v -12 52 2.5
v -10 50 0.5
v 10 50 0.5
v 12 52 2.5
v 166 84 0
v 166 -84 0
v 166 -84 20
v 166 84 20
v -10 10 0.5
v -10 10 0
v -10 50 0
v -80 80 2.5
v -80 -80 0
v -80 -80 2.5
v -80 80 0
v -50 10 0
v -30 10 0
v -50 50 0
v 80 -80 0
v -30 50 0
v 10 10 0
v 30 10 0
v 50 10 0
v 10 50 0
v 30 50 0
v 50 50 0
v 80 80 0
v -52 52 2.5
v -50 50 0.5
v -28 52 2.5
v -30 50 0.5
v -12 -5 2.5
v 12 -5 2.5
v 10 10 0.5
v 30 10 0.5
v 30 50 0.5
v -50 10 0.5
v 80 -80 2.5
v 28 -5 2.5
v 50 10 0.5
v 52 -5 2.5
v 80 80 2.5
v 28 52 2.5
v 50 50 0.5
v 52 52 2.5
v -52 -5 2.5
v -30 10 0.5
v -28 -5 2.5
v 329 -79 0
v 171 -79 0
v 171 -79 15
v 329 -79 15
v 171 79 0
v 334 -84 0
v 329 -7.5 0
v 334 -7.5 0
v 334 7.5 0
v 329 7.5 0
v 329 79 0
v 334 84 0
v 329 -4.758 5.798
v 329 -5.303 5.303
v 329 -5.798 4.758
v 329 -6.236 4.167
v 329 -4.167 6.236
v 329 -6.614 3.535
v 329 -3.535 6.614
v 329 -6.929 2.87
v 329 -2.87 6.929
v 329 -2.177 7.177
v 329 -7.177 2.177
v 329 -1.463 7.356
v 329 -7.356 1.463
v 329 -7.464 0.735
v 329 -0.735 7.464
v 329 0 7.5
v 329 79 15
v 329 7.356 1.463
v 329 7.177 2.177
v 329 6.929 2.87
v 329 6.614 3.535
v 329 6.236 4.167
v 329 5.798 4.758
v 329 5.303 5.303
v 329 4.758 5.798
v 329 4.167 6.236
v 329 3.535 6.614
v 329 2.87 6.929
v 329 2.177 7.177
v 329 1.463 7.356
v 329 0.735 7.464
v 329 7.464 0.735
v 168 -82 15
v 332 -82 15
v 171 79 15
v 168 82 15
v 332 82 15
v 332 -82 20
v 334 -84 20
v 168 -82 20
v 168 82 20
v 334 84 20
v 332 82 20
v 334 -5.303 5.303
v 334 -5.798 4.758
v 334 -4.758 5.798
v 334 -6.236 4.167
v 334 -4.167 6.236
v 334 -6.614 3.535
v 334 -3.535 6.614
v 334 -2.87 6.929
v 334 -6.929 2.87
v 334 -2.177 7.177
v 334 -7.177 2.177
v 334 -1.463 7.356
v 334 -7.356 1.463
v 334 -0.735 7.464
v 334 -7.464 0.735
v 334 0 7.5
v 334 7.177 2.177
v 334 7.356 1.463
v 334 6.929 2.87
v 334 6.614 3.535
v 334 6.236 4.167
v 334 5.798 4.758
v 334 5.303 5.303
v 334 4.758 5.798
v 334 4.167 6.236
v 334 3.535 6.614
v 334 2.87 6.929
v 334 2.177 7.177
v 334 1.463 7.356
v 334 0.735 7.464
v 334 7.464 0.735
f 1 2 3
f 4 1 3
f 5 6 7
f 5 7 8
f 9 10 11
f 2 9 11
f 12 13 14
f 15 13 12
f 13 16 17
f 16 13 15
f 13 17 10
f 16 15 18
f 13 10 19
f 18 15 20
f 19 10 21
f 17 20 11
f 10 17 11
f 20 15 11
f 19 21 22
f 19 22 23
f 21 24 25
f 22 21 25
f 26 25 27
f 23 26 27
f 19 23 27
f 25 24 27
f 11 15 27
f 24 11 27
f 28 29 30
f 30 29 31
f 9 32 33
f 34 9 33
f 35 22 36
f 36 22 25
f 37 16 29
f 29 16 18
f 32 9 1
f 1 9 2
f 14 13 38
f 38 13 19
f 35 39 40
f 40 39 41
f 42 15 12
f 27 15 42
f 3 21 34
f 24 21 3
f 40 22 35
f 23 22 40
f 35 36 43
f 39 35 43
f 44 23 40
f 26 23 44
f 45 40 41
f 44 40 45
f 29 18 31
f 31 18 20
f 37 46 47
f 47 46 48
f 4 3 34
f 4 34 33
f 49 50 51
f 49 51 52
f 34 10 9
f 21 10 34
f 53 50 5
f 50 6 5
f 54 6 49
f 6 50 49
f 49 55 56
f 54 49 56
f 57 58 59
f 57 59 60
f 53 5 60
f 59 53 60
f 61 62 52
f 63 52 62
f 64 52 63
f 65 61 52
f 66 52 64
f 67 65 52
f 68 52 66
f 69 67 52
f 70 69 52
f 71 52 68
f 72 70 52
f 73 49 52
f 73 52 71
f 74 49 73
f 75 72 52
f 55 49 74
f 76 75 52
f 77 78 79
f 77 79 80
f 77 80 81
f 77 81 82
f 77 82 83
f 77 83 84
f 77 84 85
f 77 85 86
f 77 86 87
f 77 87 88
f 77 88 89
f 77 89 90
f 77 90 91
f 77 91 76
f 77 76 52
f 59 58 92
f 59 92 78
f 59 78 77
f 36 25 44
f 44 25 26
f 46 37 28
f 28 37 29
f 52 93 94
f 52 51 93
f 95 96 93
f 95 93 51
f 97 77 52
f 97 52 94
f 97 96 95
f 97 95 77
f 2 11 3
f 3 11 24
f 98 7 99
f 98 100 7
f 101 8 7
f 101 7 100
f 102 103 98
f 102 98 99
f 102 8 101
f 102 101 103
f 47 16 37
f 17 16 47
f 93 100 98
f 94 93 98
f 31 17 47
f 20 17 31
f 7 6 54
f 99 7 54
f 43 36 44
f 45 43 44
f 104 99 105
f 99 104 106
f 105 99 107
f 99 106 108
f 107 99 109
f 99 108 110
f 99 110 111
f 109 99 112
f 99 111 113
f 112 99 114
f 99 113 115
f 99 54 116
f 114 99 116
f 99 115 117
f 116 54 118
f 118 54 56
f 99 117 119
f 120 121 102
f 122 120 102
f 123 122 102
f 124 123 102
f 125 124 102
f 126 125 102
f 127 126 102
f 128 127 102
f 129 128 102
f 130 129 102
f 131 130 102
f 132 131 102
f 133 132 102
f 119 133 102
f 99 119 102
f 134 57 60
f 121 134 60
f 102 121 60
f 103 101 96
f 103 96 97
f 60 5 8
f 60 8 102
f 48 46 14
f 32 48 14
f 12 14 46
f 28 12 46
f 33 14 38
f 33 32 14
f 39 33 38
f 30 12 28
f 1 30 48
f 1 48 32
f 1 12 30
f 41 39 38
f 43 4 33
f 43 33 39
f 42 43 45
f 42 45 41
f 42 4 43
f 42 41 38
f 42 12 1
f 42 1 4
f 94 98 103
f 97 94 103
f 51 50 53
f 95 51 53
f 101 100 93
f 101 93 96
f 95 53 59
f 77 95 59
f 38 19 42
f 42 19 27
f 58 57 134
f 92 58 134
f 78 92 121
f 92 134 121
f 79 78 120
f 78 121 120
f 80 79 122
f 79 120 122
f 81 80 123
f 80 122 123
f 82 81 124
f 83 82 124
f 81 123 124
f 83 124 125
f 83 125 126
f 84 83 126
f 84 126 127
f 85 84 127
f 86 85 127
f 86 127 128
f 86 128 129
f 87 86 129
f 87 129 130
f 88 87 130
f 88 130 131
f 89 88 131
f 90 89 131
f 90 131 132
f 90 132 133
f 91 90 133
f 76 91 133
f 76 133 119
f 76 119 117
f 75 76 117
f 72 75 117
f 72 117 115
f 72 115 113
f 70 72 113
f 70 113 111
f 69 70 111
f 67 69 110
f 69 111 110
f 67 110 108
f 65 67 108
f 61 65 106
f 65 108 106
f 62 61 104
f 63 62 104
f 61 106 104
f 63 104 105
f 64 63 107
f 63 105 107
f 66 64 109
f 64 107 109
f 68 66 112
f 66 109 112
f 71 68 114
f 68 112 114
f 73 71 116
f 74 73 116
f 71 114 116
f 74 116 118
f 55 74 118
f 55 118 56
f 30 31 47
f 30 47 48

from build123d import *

# Parameters (mm, degrees)
SKETCH_W        = 160
SKETCH_H        = 160
SKETCH_W_2      = 20
SKETCH_H_2      = 40
PAD_DEPTH       = 2.5
CHAMFER_1_SIZE2 = 15
CHAMFER_1_SIZE  = 2
CHAMFER_2_SIZE2 = 15
CHAMFER_2_SIZE  = 2
CHAMFER_3_SIZE2 = 15
CHAMFER_3_SIZE  = 2
CHAMFER001_SIZE = 2
SKETCH001_W     = 168
SKETCH001_H     = 168
SKETCH001_W_2   = 158
SKETCH001_H_2   = 158
PAD001_DEPTH    = 20
SKETCH002_W     = 164
SKETCH002_H     = 164
POCKET_DEPTH    = 5
SKETCH003_R     = 7.5
POCKET001_DEPTH = 15


with BuildPart() as backplate:
    # Sketch → Pad (new body)
    with BuildSketch(Plane.XY):
        Rectangle(SKETCH_W, SKETCH_H)
        with Locations((-40, 30)):
            Rectangle(SKETCH_W_2, SKETCH_H_2, mode=Mode.SUBTRACT)
        with Locations((0, 30)):
            Rectangle(SKETCH_W_2, SKETCH_H_2, mode=Mode.SUBTRACT)
        with Locations((40, 30)):
            Rectangle(SKETCH_W_2, SKETCH_H_2, mode=Mode.SUBTRACT)
    extrude(amount=PAD_DEPTH)

    # Chamfer 1
    chamfer_1_edges = [backplate.edges().sort_by_distance(p)[0] for p in [
        (40, 10, 2.5),
    ]]
    chamfer_1_side = backplate.faces().sort_by_distance((40, 10, 1.25))[0]
    chamfer(chamfer_1_edges, length=CHAMFER_1_SIZE, length2=CHAMFER_1_SIZE2, reference=chamfer_1_side)

    # Chamfer 2
    chamfer_2_edges = [backplate.edges().sort_by_distance(p)[0] for p in [
        (0, 10, 2.5),
    ]]
    chamfer_2_side = backplate.faces().sort_by_distance((0, 10, 1.25))[0]
    chamfer(chamfer_2_edges, length=CHAMFER_2_SIZE, length2=CHAMFER_2_SIZE2, reference=chamfer_2_side)

    # Chamfer 3
    chamfer_3_edges = [backplate.edges().sort_by_distance(p)[0] for p in [
        (-40, 10, 2.5),
    ]]
    chamfer_3_side = backplate.faces().sort_by_distance((-40, 10, 1.25))[0]
    chamfer(chamfer_3_edges, length=CHAMFER_3_SIZE, length2=CHAMFER_3_SIZE2, reference=chamfer_3_side)

    # Chamfer001
    chamfer001_edges = [backplate.edges().sort_by_distance(p)[0] for p in [
        (-50, 2.5, 2.5),
        (-50, 30, 2.5),
        (-40, 50, 2.5),
        (-30, 30, 2.5),
        (-30, 2.5, 2.5),
        (-10, 2.5, 2.5),
        (-10, 30, 2.5),
        (0, 50, 2.5),
        (10, 30, 2.5),
        (10, 2.5, 2.5),
        (30, 2.5, 2.5),
        (30, 30, 2.5),
        (40, 50, 2.5),
        (50, 30, 2.5),
        (50, 2.5, 2.5),
    ]]
    chamfer(chamfer001_edges, length=CHAMFER001_SIZE)


with BuildPart() as frame:
    # Sketch001 → Pad001 (new body)
    with BuildSketch(Plane.XY):
        with Locations((250, 0)):
            Rectangle(SKETCH001_W, SKETCH001_H)
        with Locations((250, 0)):
            Rectangle(SKETCH001_W_2, SKETCH001_H_2, mode=Mode.SUBTRACT)
    extrude(amount=PAD001_DEPTH)

    # Sketch002 (on Face10 of Pad001) → Pocket (cut)
    with BuildSketch(Plane.XY.offset(20)):
        with Locations((250, 0)):
            Rectangle(SKETCH002_W, SKETCH002_H)
    extrude(amount=-POCKET_DEPTH, mode=Mode.SUBTRACT)

    # Sketch003 (on Face6 of Pocket) → Pocket001 (cut)
    with BuildSketch(Plane.YZ.offset(334)):
        Circle(SKETCH003_R)
    extrude(amount=-POCKET001_DEPTH, mode=Mode.SUBTRACT)


solid = Compound([backplate.part, frame.part])
